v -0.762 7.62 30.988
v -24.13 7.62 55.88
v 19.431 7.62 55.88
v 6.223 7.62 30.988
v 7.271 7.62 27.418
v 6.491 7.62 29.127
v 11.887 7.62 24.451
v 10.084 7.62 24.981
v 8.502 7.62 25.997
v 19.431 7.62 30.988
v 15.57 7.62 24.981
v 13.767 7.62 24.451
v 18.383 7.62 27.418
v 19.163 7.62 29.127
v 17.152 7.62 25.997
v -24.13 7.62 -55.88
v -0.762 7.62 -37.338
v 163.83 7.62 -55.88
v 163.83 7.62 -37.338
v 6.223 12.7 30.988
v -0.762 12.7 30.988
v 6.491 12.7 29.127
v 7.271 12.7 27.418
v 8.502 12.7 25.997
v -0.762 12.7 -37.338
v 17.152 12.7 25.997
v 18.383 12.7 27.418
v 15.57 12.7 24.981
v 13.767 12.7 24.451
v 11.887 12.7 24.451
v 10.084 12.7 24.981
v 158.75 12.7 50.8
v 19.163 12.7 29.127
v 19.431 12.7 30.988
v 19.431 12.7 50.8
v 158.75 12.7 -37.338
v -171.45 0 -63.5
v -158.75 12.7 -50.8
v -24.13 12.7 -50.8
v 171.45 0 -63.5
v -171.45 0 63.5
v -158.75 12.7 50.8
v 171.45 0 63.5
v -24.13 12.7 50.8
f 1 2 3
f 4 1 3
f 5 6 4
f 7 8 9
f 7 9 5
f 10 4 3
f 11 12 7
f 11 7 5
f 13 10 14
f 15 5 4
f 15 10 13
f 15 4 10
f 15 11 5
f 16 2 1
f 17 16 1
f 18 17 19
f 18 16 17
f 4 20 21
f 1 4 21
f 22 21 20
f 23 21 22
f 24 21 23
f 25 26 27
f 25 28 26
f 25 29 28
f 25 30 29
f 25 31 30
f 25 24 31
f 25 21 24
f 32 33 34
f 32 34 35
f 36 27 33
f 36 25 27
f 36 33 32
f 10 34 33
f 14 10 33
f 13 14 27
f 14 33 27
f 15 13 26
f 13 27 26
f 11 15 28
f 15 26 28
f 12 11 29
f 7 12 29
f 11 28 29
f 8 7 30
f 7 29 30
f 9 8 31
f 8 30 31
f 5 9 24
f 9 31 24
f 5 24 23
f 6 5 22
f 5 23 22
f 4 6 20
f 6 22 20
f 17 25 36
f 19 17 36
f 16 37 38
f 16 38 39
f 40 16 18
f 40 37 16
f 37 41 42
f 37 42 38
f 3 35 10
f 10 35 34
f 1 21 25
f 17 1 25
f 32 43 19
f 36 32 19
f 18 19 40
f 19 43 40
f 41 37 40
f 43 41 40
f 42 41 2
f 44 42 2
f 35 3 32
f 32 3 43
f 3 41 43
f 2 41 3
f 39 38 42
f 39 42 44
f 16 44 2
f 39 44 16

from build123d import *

# Parameters (mm, degrees)
SKETCH1_W           = 342.9
SKETCH1_H           = 127
BOSS_EXTRUDE1_DEPTH = 12.7
DRAFT1_ANGLE        = -45
CUT_EXTRUDE1_DEPTH  = 5.08
SKETCH3_W           = 23.368
SKETCH3_H           = 127
CUT_EXTRUDE2_DEPTH  = 5.08
SKETCH4_W           = 172.212
SKETCH4_H           = 26.162
CUT_EXTRUDE3_DEPTH  = 5.08


with BuildPart() as part:
    # Sketch1 → Boss-Extrude1 (new body)
    with BuildSketch(Plane(origin=(0, 0, 0), x_dir=(1, 0, 0), z_dir=(0, 1, 0))):
        Rectangle(SKETCH1_W, SKETCH1_H)
    extrude(amount=BOSS_EXTRUDE1_DEPTH)

    # Draft1
    draft1_faces = [part.faces().sort_by_distance(p)[0] for p in [
        (0, 6.35, -63.5),
        (-171.45, 6.35, 0),
        (171.45, 6.35, 0),
        (0, 6.35, 63.5),
    ]]
    draft(draft1_faces, Plane(origin=(0, 0, 0), x_dir=(0, 0, -1), z_dir=(0, -1, 0)), DRAFT1_ANGLE)

    # Sketch2 → Cut-Extrude1 (cut)
    with BuildSketch(Plane(origin=(0, 12.7, 0), x_dir=(1, 0, 0), z_dir=(0, 1, 0))):
        with BuildLine():
            Line((-19.431, -63.5), (19.431, -63.5))
            Line((19.431, -63.5), (19.431, -30.988))
            ThreePointArc((19.431, -30.988), (12.827, -24.384), (6.223, -30.988))
            Line((6.223, -30.988), (-6.223, -30.988))
            ThreePointArc((-6.223, -30.988), (-12.827, -24.384), (-19.431, -30.988))
            Line((-19.431, -30.988), (-19.431, -63.5))
        make_face()
    extrude(amount=-CUT_EXTRUDE1_DEPTH, mode=Mode.SUBTRACT)

    # Sketch3 → Cut-Extrude2 (cut)
    with BuildSketch(Plane(origin=(0, 12.7, 0), x_dir=(1, 0, 0), z_dir=(0, 1, 0))):
        with Locations((-12.446, 0)):
            Rectangle(SKETCH3_W, SKETCH3_H)
    extrude(amount=-CUT_EXTRUDE2_DEPTH, mode=Mode.SUBTRACT)

    # Sketch4 → Cut-Extrude3 (cut)
    with BuildSketch(Plane(origin=(0, 12.7, 0), x_dir=(1, 0, 0), z_dir=(0, 1, 0))):
        with Locations((85.344, 50.419)):
            Rectangle(SKETCH4_W, SKETCH4_H)
    extrude(amount=-CUT_EXTRUDE3_DEPTH, mode=Mode.SUBTRACT)


solid = part.part
